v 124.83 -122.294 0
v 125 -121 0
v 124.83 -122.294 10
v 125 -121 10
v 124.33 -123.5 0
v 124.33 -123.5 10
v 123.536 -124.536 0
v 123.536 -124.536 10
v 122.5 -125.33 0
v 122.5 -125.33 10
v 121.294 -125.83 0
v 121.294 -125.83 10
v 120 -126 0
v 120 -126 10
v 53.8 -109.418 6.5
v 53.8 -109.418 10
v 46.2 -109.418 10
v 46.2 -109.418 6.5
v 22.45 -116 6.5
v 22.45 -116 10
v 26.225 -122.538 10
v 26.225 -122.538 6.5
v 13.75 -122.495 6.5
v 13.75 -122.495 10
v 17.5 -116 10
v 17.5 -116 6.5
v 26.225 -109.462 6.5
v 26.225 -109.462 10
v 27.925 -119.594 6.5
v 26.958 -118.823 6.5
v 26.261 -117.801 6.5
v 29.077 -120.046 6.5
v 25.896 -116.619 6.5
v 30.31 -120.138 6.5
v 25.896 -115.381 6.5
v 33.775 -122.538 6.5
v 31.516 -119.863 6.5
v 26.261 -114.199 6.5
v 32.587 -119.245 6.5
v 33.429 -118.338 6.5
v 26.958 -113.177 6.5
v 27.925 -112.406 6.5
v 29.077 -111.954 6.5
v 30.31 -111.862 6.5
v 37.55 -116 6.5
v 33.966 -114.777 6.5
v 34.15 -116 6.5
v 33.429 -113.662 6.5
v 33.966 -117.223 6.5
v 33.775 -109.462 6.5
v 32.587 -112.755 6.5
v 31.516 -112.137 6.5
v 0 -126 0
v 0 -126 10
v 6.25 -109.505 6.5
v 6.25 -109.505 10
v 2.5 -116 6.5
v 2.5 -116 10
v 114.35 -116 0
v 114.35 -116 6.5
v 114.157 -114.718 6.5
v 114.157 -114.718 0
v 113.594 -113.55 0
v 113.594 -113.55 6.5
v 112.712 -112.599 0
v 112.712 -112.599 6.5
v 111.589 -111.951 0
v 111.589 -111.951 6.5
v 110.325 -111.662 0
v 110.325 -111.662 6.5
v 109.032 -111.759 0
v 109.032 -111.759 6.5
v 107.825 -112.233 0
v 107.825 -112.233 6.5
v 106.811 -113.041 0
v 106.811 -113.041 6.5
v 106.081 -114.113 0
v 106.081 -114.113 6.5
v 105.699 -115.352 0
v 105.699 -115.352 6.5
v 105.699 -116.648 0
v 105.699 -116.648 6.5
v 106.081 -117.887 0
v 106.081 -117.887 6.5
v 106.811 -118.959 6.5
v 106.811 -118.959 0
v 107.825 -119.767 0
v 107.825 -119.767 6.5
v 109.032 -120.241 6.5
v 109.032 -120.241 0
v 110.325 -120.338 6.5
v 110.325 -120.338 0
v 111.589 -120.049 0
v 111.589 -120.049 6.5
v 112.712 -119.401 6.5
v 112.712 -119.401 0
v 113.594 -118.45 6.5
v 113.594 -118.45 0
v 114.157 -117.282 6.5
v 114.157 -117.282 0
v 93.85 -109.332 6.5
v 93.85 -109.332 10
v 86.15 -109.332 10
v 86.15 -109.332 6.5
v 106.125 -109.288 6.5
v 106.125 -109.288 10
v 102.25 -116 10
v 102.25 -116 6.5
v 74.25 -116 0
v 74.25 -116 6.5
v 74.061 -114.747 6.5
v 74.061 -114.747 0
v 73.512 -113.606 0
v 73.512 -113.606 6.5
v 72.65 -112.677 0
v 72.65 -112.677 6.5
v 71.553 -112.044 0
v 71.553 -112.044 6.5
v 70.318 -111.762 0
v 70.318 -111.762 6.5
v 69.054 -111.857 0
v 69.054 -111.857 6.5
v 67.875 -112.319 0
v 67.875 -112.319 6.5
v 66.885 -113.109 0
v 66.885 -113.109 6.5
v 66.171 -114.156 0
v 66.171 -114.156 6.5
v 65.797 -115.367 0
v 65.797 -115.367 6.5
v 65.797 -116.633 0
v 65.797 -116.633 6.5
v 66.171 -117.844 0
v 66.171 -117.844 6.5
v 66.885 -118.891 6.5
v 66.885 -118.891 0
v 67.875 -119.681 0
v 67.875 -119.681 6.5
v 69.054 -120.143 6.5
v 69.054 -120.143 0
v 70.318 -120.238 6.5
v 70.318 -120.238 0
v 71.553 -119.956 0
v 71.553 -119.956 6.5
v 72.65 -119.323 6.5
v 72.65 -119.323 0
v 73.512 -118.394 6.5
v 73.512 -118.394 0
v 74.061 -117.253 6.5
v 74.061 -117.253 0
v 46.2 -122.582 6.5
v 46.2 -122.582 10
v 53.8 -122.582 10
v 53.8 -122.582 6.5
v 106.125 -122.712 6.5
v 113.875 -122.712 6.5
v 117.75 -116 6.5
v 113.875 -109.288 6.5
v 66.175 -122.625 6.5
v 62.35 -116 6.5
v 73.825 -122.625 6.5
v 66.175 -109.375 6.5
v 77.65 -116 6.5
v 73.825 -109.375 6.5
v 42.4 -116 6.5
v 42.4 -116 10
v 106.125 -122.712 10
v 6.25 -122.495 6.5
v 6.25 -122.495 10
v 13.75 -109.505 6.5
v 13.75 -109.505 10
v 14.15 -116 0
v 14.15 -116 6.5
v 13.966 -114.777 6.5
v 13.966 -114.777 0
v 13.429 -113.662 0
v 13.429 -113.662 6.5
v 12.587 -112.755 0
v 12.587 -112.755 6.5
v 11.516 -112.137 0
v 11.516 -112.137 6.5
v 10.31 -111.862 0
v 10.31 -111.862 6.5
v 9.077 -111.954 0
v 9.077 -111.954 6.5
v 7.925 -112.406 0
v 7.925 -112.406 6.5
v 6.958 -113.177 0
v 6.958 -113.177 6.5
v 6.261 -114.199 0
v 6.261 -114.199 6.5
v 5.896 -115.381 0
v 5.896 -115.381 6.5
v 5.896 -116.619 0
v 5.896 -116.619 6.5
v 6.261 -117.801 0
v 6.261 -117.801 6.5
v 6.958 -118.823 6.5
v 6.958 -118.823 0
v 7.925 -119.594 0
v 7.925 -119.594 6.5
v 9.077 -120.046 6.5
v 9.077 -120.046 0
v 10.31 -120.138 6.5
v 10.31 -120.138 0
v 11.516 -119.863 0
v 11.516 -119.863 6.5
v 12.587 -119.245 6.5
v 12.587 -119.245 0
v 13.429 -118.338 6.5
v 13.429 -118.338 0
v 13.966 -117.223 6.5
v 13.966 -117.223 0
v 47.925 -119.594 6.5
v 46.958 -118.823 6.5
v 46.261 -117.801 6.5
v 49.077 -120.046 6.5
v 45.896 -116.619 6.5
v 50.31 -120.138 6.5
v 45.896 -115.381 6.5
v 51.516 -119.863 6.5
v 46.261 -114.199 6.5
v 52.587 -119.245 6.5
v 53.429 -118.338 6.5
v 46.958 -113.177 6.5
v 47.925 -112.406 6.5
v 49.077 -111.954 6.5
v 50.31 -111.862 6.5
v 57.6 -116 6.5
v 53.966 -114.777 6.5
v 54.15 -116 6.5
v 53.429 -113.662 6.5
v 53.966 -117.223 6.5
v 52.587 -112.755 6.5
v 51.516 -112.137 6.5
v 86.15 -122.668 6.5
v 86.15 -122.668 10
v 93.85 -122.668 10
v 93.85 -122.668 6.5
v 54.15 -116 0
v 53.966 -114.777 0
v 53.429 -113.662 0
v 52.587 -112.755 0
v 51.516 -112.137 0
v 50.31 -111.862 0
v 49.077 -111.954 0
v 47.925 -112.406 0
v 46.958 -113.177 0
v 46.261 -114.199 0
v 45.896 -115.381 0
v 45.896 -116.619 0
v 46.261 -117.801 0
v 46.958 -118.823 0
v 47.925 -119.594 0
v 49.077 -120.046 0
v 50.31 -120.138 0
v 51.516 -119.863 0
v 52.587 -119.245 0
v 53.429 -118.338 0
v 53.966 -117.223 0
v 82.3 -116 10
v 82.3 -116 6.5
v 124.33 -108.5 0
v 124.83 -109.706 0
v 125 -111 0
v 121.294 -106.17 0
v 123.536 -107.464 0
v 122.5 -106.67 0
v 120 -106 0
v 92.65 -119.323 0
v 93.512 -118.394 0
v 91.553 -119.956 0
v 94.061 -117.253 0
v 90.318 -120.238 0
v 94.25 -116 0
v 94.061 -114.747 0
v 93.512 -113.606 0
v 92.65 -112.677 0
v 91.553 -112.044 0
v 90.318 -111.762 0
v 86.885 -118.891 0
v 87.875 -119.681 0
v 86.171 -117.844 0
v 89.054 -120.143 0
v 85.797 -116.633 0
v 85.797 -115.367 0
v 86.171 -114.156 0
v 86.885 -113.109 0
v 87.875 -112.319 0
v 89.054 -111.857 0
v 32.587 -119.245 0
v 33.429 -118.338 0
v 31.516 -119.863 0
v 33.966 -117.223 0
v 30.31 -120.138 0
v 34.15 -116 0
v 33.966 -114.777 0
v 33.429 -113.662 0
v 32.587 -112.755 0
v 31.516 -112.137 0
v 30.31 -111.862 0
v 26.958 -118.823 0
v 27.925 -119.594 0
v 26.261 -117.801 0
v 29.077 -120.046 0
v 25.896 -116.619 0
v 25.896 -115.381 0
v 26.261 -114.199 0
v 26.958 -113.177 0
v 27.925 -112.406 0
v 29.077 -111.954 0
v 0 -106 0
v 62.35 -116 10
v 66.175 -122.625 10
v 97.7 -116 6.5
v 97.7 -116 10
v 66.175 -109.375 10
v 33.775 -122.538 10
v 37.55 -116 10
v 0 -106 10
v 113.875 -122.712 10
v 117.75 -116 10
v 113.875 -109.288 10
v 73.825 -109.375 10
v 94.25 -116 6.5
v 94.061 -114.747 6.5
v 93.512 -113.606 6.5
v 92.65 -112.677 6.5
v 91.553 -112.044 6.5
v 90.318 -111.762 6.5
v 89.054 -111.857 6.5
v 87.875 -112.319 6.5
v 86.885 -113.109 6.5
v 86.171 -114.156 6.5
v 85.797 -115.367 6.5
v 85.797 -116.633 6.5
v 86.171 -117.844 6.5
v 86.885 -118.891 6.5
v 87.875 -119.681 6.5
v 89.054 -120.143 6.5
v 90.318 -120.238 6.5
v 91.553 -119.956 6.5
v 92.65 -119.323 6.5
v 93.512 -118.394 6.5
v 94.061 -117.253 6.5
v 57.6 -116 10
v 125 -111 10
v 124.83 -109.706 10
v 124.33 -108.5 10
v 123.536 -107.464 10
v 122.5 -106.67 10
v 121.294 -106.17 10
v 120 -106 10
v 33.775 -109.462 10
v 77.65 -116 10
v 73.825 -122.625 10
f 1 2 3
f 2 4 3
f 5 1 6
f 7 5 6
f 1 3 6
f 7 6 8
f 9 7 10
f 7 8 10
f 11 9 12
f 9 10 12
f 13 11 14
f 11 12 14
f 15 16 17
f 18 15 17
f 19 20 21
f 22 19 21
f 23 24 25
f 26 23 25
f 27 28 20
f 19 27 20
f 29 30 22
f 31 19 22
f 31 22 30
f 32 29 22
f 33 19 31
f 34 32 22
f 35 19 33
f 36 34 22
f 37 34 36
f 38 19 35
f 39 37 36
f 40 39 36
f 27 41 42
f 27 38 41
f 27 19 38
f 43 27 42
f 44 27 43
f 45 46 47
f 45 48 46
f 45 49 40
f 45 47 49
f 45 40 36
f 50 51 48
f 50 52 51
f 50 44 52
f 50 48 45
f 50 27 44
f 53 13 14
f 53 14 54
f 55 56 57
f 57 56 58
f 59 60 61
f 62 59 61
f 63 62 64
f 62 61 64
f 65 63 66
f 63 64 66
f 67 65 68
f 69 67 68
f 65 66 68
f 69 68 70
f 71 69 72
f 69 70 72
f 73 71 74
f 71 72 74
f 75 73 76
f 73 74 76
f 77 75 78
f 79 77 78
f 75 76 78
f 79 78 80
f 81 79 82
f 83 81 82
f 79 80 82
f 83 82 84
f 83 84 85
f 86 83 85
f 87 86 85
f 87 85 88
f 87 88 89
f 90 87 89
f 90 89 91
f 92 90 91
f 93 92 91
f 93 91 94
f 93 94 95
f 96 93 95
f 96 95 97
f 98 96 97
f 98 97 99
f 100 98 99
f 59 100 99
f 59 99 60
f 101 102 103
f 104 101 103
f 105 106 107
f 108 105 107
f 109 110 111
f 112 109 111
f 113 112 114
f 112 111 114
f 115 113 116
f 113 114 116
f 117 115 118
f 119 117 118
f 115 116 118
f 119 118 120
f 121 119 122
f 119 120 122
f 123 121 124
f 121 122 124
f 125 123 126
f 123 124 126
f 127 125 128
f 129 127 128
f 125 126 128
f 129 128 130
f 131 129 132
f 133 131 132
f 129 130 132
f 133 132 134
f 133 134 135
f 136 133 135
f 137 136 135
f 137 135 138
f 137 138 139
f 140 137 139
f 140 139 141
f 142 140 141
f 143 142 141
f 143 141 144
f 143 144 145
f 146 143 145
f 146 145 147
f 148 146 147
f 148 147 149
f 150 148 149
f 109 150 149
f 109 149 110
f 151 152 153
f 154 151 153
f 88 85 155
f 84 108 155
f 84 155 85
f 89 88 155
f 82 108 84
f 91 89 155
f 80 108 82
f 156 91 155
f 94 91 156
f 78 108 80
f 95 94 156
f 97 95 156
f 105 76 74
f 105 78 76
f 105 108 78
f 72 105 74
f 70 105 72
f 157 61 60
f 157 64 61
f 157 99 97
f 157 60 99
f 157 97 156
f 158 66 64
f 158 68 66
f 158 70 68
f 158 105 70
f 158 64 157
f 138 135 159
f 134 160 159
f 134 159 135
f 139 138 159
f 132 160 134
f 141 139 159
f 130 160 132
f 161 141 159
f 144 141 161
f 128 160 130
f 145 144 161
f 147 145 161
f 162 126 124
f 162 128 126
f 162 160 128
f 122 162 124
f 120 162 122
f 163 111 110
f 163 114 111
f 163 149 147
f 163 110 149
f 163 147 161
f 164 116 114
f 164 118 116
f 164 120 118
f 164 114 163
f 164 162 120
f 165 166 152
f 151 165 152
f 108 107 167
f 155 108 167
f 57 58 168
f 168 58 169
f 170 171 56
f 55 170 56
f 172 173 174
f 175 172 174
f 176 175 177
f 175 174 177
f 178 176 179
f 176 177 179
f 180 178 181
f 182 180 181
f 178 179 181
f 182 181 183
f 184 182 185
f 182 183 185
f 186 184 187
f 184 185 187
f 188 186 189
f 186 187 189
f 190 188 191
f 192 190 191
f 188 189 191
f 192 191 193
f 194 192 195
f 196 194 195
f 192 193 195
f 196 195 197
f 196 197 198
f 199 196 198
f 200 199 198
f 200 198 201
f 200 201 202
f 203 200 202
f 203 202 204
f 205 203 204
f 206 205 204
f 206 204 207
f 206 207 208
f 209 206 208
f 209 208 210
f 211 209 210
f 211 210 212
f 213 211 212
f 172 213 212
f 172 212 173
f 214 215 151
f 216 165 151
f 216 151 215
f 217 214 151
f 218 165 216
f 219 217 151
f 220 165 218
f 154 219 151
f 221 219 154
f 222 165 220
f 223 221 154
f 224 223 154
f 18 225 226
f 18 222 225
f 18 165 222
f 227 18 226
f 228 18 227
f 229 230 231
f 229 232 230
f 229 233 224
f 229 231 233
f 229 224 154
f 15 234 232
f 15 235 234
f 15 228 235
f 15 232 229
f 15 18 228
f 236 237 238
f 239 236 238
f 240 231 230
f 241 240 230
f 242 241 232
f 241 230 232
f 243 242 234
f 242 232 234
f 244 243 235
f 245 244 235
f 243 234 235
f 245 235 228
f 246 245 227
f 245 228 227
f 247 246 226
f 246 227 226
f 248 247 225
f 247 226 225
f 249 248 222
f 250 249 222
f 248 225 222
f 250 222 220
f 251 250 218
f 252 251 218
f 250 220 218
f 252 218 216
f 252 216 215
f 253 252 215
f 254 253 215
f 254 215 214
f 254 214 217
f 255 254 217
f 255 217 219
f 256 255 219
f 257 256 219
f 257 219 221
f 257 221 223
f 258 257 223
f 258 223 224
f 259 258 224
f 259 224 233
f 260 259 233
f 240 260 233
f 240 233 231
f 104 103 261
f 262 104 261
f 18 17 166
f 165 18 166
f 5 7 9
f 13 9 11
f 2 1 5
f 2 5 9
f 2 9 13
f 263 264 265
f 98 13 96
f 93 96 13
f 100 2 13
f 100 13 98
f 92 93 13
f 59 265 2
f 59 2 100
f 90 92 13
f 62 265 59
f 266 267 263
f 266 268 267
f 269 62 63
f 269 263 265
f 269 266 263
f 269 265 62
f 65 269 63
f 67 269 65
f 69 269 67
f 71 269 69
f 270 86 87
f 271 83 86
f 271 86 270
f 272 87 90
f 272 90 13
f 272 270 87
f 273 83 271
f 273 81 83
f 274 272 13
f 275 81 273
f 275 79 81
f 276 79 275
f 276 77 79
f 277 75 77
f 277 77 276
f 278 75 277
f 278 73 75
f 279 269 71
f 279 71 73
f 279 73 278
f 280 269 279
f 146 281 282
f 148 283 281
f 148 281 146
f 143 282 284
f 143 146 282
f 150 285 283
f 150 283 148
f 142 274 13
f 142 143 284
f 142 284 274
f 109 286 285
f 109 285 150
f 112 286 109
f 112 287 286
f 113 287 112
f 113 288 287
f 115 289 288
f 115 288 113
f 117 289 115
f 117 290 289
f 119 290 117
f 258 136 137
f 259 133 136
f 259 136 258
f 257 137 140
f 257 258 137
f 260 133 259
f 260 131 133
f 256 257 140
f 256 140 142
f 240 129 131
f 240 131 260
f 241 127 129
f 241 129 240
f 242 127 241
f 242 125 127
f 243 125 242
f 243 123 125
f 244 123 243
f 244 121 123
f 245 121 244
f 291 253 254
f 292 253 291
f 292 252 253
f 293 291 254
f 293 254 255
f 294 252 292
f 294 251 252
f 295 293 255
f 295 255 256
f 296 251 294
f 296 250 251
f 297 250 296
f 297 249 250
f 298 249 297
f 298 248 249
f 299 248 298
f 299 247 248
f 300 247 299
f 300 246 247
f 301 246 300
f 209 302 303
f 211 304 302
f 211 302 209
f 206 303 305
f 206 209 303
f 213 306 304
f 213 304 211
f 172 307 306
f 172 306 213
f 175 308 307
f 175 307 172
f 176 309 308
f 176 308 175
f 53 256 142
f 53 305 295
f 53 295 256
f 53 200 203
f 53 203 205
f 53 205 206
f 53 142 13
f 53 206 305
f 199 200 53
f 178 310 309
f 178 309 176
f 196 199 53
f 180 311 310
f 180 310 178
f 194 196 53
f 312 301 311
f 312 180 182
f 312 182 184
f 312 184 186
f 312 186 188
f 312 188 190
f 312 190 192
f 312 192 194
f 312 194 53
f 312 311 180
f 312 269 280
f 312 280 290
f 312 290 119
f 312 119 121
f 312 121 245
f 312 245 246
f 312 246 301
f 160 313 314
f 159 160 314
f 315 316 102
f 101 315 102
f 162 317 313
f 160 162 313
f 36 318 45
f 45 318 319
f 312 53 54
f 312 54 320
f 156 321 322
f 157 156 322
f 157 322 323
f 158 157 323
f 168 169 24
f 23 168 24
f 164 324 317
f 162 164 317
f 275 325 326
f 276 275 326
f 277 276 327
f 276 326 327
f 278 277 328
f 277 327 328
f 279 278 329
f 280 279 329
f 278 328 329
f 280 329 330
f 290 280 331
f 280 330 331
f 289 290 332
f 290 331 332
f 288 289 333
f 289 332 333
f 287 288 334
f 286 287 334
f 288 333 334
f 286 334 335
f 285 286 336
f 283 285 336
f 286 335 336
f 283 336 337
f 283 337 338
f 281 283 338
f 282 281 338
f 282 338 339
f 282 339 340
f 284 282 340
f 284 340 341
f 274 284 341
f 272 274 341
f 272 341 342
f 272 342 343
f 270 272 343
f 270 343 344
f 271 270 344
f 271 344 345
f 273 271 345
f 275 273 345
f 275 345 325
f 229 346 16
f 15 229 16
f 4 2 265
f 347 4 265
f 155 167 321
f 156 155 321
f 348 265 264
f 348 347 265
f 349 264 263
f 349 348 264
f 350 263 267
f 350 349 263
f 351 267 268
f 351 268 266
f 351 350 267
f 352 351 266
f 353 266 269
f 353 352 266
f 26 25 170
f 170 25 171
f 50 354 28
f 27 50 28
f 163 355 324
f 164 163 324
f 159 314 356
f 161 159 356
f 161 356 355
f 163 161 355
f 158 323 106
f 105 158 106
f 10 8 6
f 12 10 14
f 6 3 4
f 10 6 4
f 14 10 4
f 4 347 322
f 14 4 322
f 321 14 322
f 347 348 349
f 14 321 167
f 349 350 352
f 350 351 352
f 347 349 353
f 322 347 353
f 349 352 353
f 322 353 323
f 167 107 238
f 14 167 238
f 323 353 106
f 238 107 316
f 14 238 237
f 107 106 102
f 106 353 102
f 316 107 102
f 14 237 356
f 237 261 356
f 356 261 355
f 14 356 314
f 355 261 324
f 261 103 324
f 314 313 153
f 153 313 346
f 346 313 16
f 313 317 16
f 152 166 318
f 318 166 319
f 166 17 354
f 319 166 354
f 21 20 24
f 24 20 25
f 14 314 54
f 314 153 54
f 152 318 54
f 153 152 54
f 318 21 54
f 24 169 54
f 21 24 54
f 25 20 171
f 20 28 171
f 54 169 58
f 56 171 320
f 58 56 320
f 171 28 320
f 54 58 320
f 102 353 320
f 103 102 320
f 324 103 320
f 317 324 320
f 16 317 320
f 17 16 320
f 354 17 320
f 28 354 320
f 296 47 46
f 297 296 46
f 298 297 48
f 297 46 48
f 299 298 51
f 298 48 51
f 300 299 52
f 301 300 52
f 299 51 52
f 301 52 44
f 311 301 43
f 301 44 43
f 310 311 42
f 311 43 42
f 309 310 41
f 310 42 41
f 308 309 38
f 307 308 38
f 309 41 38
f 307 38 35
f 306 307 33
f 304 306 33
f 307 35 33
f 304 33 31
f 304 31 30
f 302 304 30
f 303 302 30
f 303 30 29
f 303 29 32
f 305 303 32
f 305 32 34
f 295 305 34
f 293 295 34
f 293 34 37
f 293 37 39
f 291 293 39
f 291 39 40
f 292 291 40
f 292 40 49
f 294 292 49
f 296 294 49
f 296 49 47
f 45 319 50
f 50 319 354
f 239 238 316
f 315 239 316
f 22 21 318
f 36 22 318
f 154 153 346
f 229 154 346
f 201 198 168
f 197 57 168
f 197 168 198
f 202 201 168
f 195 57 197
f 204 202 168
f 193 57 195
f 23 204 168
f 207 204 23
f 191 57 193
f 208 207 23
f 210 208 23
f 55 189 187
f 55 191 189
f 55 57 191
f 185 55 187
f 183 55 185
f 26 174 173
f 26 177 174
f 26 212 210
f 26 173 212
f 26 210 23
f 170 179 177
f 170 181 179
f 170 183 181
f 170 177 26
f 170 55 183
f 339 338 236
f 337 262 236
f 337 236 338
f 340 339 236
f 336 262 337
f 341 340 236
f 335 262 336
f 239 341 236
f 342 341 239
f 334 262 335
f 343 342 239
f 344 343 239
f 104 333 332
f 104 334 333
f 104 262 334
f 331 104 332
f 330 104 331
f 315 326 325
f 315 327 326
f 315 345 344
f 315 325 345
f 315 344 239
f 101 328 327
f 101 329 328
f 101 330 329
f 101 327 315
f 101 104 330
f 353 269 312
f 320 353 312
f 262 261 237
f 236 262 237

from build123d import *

# Parameters (mm, degrees)
SKETCH_1_W                  = 125
SKETCH_1_H                  = 20
EXTRUDE_1_DEPTH             = 10
CUT_EXTRUDE_1_DEPTH         = 3.5
CUT_EXTRUDE_2_DEPTH         = 3.5
CUT_EXTRUDE_3_DEPTH         = 3.5
CUT_EXTRUDE_4_DEPTH         = 3.5
CUT_EXTRUDE_5_DEPTH         = 3.5
CUT_EXTRUDE_6_DEPTH         = 3.5
HOLE_WIZARD_8_7_8_7_1_D     = 8.7
HOLE_WIZARD_8_7_8_7_1_DEPTH = 10
HOLE_WIZARD_8_5_8_5_1_D     = 8.5
HOLE_WIZARD_8_5_8_5_1_DEPTH = 10
HOLE_WIZARD_8_3_8_3_1_D     = 8.3
HOLE_WIZARD_8_3_8_3_1_DEPTH = 10
FILLET_1_R                  = 5


with BuildPart() as part:
    # 草图1 → 凸台-拉伸1 (new body)
    with BuildSketch(Plane(origin=(0, 0, 0), x_dir=(-1, 0, 0), z_dir=(0, 0, -1))):
        with Locations((-62.5, -116)):
            Rectangle(SKETCH_1_W, SKETCH_1_H)
    extrude(amount=-EXTRUDE_1_DEPTH)

    # 草图2 → 切除-拉伸1 (cut)
    with BuildSketch(Plane.XY.offset(10)):
        Polygon((93.85, -122.668395609), (97.7, -116), (93.85, -109.331604391), (86.15, -109.331604391), (82.3, -116), (86.15, -122.668395609), align=None)
    extrude(amount=-CUT_EXTRUDE_1_DEPTH, mode=Mode.SUBTRACT)

    # 草图3 → 切除-拉伸2 (cut)
    with BuildSketch(Plane.XY.offset(10)):
        Polygon((73.825, -122.625094339), (77.65, -116), (73.825, -109.374905661), (66.175, -109.374905661), (62.35, -116), (66.175, -122.625094339), align=None)
    extrude(amount=-CUT_EXTRUDE_2_DEPTH, mode=Mode.SUBTRACT)

    # 草图4 → 切除-拉伸3 (cut)
    with BuildSketch(Plane.XY.offset(10)):
        Polygon((53.8, -122.581793069), (57.6, -116), (53.8, -109.418206931), (46.2, -109.418206931), (42.4, -116), (46.2, -122.581793069), align=None)
    extrude(amount=-CUT_EXTRUDE_3_DEPTH, mode=Mode.SUBTRACT)

    # 草图5 → 切除-拉伸4 (cut)
    with BuildSketch(Plane.XY.offset(10)):
        Polygon((33.775, -122.538491799), (37.55, -116), (33.775, -109.461508201), (26.225, -109.461508201), (22.45, -116), (26.225, -122.538491799), align=None)
    extrude(amount=-CUT_EXTRUDE_4_DEPTH, mode=Mode.SUBTRACT)

    # 草图6 → 切除-拉伸5 (cut)
    with BuildSketch(Plane.XY.offset(10)):
        Polygon((13.75, -122.495190528), (17.5, -116), (13.75, -109.504809472), (6.25, -109.504809472), (2.5, -116), (6.25, -122.495190528), align=None)
    extrude(amount=-CUT_EXTRUDE_5_DEPTH, mode=Mode.SUBTRACT)

    # 草图7 → 切除-拉伸6 (cut)
    with BuildSketch(Plane.XY.offset(10)):
        Polygon((113.875, -122.711696879), (117.75, -116), (113.875, -109.288303121), (106.125, -109.288303121), (102.25, -116), (106.125, -122.711696879), align=None)
    extrude(amount=-CUT_EXTRUDE_6_DEPTH, mode=Mode.SUBTRACT)

    # Ø8.7 (8.7) 直径孔1
    with Locations(Plane(origin=(0, 0, 0), x_dir=(-1, 0, 0), z_dir=(0, 0, -1))):
        with Locations((-110, -116)):
            Hole(HOLE_WIZARD_8_7_8_7_1_D / 2, depth=HOLE_WIZARD_8_7_8_7_1_DEPTH)

    # Ø8.5 (8.5) 直径孔1
    with Locations(Plane(origin=(0, 0, 0), x_dir=(-1, 0, 0), z_dir=(0, 0, -1))):
        with Locations((-70, -116), (-90, -116)):
            Hole(HOLE_WIZARD_8_5_8_5_1_D / 2, depth=HOLE_WIZARD_8_5_8_5_1_DEPTH)

    # Ø8.3 (8.3) 直径孔1
    with Locations(Plane(origin=(0, 0, 0), x_dir=(-1, 0, 0), z_dir=(0, 0, -1))):
        with Locations((-30, -116), (-50, -116), (-10, -116)):
            Hole(HOLE_WIZARD_8_3_8_3_1_D / 2, depth=HOLE_WIZARD_8_3_8_3_1_DEPTH)

    # 圆角1
    fillet_1_edges = [part.edges().sort_by_distance(p)[0] for p in [
        (125, -126, 5),
        (125, -106, 5),
    ]]
    fillet(fillet_1_edges, radius=FILLET_1_R)


solid = part.part
